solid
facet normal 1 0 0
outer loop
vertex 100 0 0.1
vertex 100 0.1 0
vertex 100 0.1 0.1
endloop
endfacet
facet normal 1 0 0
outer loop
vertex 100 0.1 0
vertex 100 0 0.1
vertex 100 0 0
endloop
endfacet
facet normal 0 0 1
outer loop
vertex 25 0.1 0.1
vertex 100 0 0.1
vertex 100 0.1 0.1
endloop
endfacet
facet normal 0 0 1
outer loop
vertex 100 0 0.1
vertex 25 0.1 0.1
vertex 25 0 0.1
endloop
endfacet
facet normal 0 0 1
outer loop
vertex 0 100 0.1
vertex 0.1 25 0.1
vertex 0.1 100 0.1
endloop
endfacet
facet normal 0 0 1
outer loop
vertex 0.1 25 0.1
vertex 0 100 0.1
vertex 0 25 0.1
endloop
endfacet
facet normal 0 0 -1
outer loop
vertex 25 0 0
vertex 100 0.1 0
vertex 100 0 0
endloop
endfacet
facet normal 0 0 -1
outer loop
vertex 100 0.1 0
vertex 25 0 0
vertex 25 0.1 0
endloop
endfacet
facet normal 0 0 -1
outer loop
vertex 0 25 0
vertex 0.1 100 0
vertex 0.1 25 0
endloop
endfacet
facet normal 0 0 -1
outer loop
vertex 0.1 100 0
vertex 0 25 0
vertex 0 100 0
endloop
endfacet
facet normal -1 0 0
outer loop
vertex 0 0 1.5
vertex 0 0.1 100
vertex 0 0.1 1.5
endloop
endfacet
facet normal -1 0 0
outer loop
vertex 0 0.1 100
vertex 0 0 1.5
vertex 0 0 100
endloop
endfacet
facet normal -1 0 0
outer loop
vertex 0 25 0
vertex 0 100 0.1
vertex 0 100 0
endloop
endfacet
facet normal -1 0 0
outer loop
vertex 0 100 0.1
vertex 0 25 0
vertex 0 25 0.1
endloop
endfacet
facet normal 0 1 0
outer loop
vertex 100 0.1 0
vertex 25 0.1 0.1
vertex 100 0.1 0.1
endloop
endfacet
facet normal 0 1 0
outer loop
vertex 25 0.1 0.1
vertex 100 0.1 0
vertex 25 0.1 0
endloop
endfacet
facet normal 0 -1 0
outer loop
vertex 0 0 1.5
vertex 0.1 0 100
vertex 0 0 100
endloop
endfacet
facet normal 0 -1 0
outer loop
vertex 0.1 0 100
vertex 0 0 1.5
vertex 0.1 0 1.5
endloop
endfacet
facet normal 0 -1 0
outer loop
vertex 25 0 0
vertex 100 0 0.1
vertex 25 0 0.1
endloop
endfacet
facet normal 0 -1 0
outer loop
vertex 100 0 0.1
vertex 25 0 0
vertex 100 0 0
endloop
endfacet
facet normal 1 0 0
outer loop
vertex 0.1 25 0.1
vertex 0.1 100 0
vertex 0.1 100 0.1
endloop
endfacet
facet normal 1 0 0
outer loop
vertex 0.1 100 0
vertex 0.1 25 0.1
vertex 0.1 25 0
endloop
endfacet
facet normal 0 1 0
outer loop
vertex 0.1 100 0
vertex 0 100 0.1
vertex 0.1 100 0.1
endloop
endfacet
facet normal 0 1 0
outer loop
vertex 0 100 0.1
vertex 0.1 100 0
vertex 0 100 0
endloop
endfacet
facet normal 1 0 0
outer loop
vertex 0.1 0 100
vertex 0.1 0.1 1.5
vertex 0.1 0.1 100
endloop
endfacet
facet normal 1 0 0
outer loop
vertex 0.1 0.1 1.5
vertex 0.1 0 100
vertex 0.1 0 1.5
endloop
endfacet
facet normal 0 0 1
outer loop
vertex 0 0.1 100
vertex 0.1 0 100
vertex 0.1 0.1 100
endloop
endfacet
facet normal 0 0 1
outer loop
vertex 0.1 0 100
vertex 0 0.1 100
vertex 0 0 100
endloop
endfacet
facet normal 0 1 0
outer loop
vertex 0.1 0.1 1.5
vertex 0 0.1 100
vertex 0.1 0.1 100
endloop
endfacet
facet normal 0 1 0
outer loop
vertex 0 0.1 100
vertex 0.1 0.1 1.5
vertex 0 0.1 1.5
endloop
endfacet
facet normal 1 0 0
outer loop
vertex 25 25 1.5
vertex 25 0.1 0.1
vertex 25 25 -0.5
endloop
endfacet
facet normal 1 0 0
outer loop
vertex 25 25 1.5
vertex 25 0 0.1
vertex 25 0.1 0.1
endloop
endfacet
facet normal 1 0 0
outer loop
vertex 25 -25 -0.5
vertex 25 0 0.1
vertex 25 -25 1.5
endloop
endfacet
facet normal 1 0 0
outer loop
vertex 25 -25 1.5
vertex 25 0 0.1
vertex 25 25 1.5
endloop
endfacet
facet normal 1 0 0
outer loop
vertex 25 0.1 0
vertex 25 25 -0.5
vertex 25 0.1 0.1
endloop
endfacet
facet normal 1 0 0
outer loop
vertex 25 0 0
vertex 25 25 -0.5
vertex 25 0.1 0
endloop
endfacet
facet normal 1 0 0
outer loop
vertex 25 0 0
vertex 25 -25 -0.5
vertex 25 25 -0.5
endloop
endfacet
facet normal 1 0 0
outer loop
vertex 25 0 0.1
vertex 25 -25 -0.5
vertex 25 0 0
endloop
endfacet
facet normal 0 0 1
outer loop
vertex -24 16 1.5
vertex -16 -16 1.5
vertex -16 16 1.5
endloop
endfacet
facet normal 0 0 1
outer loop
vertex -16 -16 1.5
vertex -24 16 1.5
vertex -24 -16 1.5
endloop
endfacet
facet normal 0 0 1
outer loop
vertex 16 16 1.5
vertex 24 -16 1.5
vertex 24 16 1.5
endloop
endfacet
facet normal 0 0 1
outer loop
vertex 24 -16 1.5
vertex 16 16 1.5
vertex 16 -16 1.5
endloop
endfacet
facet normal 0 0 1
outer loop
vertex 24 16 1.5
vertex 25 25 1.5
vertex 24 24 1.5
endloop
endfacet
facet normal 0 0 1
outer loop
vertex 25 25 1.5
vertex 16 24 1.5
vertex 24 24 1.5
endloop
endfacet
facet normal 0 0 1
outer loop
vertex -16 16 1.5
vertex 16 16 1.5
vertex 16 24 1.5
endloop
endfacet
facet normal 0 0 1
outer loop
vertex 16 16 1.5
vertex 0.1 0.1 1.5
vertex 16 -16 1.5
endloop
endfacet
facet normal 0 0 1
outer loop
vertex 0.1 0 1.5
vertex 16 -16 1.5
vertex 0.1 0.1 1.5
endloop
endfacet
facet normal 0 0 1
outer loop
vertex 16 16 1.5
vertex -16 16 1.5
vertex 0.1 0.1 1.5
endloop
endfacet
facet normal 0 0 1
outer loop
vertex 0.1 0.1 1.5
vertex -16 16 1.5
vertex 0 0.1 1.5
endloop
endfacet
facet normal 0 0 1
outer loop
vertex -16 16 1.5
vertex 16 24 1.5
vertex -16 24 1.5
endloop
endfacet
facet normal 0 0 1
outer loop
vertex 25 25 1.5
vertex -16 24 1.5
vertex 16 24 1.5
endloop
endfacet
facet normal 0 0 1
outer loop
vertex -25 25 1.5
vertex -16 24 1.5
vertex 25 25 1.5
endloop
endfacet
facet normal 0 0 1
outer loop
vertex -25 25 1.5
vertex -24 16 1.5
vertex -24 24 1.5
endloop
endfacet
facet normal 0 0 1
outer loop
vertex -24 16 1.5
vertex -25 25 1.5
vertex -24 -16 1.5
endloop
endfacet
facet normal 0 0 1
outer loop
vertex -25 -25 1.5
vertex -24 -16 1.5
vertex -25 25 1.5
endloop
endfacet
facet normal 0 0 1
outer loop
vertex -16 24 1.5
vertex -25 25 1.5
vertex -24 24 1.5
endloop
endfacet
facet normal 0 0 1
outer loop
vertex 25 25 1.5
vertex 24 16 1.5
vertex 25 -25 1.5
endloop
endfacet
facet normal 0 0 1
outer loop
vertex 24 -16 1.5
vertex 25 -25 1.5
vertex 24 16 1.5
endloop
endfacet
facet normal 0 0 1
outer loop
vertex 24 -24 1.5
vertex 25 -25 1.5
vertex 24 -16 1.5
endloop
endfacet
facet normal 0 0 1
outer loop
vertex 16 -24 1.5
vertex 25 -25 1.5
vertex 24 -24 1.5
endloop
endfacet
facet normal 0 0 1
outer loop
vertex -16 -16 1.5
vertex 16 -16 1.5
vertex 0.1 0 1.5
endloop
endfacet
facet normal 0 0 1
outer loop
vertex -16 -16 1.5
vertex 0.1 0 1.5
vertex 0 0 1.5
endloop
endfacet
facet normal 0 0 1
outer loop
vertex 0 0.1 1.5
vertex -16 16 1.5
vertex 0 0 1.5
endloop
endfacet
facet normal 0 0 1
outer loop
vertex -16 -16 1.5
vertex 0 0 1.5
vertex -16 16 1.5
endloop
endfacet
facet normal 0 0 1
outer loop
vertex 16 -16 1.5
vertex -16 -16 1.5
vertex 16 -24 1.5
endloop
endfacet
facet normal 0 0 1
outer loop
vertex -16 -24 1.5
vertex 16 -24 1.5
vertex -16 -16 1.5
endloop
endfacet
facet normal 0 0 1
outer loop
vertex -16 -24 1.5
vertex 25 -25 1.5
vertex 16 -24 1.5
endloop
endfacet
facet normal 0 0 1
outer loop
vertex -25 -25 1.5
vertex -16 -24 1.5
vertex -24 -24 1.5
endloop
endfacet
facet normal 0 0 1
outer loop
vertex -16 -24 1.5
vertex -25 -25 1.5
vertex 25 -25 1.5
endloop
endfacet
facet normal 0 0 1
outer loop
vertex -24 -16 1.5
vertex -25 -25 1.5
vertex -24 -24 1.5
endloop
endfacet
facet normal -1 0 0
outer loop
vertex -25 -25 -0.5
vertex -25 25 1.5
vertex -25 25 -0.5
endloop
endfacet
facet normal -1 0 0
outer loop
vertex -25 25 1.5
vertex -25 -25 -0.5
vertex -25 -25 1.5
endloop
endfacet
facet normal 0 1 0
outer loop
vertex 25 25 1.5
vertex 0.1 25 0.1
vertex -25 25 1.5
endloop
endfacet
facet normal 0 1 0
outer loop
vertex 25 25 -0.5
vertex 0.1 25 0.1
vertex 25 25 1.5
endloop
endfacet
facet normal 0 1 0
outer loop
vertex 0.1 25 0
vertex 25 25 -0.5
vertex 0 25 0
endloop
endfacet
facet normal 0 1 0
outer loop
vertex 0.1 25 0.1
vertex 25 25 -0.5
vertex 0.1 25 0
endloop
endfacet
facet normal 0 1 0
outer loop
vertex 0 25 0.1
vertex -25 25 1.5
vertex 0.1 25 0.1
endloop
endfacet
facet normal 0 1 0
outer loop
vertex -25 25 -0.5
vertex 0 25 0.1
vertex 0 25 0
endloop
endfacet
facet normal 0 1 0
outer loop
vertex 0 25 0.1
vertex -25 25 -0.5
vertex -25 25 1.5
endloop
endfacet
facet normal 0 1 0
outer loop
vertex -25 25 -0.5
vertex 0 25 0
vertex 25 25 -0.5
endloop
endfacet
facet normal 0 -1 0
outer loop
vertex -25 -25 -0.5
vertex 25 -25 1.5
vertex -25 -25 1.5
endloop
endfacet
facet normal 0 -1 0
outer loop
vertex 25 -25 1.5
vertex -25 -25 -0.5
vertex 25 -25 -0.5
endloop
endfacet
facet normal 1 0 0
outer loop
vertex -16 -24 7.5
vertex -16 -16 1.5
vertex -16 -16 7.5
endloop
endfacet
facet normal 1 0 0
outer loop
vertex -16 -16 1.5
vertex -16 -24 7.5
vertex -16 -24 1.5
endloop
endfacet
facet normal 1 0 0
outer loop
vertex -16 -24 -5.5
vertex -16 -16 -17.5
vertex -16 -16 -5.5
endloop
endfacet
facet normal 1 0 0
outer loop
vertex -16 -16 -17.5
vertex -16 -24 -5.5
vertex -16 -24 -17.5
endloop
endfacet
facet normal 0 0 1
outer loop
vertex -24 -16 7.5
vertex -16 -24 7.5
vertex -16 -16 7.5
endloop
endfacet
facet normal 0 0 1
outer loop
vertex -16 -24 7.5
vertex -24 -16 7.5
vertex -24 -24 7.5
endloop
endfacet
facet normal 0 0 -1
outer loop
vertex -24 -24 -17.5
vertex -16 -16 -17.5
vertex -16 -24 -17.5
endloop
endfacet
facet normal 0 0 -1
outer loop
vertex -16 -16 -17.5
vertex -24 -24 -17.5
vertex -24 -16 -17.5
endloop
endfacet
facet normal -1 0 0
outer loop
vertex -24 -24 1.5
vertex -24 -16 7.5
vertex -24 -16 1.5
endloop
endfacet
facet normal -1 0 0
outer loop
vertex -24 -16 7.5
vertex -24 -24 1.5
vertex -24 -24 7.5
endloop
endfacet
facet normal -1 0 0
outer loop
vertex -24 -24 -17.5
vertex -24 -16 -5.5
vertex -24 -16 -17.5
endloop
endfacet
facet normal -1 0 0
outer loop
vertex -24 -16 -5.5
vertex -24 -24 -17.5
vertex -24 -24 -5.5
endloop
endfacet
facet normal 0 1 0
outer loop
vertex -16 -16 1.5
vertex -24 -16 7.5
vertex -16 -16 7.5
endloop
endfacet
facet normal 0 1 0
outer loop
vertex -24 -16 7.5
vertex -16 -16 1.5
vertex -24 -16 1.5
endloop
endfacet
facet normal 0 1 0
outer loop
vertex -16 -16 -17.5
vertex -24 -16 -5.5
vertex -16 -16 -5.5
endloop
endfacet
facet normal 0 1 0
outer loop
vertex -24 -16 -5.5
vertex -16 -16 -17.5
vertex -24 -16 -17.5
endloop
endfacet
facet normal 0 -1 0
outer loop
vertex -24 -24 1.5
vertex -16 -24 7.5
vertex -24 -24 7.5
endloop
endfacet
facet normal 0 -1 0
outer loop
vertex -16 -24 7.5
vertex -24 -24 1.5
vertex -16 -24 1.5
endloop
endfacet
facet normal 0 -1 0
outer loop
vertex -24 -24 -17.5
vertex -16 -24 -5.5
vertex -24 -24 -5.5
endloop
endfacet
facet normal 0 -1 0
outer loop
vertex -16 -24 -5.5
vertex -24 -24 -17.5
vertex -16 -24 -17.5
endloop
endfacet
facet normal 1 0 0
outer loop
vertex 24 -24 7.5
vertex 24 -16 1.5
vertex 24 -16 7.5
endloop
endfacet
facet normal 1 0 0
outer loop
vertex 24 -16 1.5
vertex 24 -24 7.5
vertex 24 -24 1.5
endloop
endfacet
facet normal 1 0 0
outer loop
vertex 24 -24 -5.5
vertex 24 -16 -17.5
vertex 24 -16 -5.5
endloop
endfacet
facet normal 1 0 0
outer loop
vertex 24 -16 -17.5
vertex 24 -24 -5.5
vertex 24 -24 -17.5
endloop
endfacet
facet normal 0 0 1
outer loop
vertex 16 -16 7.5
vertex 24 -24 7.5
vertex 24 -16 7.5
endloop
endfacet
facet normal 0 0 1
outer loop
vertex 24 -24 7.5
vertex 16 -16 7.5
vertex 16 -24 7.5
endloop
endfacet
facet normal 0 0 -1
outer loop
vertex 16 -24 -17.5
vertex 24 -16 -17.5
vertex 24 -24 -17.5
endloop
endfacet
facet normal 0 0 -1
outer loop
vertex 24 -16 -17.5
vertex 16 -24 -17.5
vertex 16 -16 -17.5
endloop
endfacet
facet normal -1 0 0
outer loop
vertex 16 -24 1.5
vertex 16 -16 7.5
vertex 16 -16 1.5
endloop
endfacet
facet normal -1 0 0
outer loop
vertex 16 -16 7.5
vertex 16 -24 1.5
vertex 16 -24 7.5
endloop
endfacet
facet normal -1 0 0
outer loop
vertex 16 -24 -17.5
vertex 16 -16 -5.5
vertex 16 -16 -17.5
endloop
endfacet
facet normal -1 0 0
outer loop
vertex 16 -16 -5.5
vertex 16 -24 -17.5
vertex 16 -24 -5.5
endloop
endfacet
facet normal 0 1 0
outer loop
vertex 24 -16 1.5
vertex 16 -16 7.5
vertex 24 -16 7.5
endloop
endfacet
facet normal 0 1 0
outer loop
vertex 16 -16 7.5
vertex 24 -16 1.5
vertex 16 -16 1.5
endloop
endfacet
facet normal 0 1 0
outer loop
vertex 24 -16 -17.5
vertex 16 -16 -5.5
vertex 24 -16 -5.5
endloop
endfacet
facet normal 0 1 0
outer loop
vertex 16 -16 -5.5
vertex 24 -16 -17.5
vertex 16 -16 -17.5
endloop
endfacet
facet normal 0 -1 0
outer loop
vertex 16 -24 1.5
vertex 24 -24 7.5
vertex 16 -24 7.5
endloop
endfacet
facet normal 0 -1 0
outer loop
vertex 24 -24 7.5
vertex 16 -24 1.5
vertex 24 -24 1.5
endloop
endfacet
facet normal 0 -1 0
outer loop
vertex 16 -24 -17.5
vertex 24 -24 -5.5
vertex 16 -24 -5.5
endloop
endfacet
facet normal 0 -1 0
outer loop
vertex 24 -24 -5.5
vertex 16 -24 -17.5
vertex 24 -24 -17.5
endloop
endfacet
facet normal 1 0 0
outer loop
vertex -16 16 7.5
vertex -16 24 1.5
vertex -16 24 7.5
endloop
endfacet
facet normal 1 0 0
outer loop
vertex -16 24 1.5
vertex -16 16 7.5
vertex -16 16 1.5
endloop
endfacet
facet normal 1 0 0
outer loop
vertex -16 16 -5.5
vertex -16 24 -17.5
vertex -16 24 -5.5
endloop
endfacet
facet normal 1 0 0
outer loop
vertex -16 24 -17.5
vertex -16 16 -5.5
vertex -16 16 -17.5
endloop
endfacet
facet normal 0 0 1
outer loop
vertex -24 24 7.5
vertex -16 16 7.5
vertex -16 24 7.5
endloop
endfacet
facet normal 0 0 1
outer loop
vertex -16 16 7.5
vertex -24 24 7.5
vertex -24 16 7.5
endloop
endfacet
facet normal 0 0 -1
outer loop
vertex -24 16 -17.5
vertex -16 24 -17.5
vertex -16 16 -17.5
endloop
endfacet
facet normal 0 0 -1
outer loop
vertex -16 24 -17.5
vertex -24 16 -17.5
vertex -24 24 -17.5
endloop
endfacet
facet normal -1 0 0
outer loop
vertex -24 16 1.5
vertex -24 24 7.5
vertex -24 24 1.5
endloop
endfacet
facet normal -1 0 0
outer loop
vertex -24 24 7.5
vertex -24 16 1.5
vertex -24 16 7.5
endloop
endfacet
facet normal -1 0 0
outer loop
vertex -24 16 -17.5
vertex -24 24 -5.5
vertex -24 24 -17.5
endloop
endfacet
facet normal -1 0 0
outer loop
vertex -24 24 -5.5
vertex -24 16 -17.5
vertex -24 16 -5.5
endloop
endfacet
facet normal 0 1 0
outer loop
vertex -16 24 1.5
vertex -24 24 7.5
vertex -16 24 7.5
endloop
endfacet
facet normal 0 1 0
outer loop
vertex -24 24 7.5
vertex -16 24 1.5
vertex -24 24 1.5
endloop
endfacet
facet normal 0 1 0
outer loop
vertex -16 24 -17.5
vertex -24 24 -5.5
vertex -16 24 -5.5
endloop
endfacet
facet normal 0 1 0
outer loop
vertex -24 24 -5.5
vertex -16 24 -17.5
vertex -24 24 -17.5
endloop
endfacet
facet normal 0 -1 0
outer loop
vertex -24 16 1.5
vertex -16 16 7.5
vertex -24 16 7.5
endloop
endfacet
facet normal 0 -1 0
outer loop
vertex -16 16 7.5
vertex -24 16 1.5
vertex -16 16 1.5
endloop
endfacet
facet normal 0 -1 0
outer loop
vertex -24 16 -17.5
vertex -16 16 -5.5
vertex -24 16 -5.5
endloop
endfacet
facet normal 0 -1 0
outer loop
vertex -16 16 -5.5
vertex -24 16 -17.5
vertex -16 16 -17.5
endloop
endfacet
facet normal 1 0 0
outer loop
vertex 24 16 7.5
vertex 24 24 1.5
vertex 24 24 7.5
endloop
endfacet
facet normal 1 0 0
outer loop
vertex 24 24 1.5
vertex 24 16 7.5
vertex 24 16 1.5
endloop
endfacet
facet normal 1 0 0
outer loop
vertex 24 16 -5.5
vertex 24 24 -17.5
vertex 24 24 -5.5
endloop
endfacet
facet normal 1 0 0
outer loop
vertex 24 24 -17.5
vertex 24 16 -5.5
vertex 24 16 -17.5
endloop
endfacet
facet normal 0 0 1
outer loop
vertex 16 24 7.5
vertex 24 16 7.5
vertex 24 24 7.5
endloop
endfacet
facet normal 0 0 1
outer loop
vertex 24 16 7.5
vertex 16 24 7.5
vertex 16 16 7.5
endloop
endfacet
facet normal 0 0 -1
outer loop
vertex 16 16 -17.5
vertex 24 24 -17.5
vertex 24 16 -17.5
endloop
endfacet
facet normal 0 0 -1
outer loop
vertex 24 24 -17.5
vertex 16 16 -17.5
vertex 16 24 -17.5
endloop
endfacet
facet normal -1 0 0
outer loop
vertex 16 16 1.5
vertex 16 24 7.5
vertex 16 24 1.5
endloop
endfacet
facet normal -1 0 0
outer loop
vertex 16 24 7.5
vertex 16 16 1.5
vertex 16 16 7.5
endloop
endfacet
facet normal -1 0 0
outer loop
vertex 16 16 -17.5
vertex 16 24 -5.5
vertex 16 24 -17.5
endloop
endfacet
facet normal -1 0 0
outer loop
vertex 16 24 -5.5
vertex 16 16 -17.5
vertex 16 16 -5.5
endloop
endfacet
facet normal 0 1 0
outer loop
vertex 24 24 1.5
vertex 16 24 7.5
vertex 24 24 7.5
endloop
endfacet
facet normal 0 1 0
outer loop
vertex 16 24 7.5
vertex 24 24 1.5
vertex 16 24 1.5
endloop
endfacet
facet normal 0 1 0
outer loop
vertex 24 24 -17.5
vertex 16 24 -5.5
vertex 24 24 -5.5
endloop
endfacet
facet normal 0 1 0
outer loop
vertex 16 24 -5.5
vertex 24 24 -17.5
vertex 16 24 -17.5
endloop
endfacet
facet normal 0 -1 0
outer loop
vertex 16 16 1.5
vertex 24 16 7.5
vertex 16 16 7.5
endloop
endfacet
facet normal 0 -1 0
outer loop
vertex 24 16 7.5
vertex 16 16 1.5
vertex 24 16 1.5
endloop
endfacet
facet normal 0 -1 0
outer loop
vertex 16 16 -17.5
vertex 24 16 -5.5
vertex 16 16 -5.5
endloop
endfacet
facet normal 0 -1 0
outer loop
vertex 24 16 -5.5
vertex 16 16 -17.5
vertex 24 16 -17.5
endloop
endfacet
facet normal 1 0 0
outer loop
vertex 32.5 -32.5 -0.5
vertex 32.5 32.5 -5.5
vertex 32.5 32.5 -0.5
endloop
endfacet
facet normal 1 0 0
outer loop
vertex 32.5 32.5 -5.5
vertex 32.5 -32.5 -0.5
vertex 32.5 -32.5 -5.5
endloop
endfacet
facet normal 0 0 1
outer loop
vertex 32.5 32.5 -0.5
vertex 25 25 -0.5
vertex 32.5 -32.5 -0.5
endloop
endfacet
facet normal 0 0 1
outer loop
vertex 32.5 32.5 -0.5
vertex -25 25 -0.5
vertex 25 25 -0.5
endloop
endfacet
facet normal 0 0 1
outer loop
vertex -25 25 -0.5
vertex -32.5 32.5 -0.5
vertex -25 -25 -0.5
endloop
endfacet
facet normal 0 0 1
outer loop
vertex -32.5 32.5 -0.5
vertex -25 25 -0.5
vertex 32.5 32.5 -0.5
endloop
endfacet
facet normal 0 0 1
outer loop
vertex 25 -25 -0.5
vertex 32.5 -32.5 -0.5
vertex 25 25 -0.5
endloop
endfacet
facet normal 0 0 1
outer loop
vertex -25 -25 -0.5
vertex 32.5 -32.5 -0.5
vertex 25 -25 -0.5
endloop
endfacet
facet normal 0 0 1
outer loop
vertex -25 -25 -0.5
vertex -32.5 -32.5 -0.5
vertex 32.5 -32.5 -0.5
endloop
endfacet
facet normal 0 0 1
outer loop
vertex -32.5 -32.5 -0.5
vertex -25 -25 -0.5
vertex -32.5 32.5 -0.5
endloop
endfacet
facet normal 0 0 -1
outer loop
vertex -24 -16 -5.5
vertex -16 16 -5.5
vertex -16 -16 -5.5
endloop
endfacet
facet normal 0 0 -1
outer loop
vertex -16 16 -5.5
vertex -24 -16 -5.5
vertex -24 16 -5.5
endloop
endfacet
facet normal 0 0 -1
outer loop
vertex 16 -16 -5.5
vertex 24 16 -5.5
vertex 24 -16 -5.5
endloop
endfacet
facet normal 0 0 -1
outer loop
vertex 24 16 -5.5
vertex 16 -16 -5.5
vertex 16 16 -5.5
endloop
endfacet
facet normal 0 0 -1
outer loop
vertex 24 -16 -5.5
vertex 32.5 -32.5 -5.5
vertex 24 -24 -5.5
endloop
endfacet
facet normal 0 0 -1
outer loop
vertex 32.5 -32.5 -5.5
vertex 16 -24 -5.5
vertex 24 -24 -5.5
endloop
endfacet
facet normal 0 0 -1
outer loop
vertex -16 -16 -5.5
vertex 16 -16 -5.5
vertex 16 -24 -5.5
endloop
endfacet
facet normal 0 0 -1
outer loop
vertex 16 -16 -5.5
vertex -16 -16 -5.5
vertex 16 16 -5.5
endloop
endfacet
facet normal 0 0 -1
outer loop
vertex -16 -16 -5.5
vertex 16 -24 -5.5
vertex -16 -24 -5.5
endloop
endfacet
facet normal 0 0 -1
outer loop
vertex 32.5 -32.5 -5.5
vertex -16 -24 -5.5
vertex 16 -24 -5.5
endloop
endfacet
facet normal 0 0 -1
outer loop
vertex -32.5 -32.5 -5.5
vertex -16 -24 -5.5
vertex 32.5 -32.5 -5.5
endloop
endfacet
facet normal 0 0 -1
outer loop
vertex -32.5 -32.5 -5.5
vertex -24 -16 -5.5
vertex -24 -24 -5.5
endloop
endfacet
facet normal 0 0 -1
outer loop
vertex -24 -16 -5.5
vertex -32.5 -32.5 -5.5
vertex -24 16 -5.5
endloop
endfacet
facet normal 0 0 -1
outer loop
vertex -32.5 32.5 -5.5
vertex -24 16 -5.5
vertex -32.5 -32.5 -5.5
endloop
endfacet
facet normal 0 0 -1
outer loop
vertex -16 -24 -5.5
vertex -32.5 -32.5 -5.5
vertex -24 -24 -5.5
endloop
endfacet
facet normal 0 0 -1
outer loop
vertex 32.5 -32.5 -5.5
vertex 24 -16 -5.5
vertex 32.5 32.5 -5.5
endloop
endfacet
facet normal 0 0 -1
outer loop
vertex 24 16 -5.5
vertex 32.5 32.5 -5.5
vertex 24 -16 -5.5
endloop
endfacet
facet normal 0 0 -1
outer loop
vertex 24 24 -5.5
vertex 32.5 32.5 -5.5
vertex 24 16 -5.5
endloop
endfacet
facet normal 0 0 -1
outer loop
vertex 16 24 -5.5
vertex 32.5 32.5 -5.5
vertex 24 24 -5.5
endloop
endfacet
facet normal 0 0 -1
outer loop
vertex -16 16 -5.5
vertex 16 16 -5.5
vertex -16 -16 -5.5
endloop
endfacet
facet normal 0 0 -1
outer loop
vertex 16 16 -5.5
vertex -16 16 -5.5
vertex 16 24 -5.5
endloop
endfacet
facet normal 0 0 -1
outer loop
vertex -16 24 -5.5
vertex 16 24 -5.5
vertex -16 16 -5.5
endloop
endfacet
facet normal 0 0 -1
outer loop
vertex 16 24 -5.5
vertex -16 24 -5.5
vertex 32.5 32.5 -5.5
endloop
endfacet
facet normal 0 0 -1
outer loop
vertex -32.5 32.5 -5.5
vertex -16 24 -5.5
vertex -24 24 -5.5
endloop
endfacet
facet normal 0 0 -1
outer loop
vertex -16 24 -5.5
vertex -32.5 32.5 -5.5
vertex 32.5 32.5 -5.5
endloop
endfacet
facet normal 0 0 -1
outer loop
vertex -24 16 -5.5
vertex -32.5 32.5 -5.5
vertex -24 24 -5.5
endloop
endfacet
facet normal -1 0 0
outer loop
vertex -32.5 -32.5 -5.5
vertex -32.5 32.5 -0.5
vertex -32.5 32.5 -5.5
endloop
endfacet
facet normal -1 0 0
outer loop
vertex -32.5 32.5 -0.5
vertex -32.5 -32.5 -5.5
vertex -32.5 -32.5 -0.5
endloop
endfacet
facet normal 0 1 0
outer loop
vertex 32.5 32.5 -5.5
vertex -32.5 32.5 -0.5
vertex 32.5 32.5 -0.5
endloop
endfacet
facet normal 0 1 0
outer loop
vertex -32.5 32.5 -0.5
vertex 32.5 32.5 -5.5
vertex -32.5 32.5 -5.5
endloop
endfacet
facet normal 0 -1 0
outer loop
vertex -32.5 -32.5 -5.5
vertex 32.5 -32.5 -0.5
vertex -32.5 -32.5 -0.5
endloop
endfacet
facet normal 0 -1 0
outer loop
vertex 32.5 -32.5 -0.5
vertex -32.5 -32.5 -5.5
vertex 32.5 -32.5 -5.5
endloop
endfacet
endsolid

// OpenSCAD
    // Combined Scene

    // Permanent Model
    
    // Permanent Model (Black)
    color([0, 0, 0]) {
        // Your permanent model code here
        cube([100,0.1,0.1], center = false);
        cube([0.1,100,0.1], center = false);
        cube([0.1,0.1,100], center = false);
    }
    

    // Dynamic Model
    translate([0, 0, 0]) {
    // Chair seat
    difference() {
        cube([50, 50, 3], center=true); // Seat
        translate([-18, -18, -0.1]) 
            cylinder(h=5, r=2, center=true); // Cutout for lighter seat
    }

    // Ergonomic backrest with a slanted design
    translate([0, -25, 12]) {
        linear_extrude(height=12) {
            polygon(points=[[0, 0], [20, 5], [30, 20], [30, 0], [-30, 0], [-30, 20], [-20, 5]], paths=[[0, 1, 2, 3, 4, 5, 6]]);
        }
    }

    // Simplified legs with wider base for stability
    for (x = [-20, 20]) {
        translate([x, -20, -5]) {
            cube([8, 8, 25], center=true); // Simplified leg
        }
    }
    for (x = [-20, 20]) {
        translate([x, 20, -5]) {
            cube([8, 8, 25], center=true); // Another leg
        }
    }

    // Armrests with ergonomic curve
    for (x = [-1, 1]) {
        translate([24 * x, -25, 10]) {
            difference() {
                scale([1, 0.5, 1])
                    rotate_extrude(angle=180)
                        translate([0, 8, 0]) // Adjusted to produce a nicer armrest
                        circle(r=3);
                translate([-6, -0.5, 0])
                    cube([12, 1, 5], center=true); // Thinner armrest block for aesthetic
            }
        }
    }

    // Wider base for overall stability
    translate([0, 0, -3]) {
        cube([65, 65, 5], center=true); // Larger base
    }
}
    
